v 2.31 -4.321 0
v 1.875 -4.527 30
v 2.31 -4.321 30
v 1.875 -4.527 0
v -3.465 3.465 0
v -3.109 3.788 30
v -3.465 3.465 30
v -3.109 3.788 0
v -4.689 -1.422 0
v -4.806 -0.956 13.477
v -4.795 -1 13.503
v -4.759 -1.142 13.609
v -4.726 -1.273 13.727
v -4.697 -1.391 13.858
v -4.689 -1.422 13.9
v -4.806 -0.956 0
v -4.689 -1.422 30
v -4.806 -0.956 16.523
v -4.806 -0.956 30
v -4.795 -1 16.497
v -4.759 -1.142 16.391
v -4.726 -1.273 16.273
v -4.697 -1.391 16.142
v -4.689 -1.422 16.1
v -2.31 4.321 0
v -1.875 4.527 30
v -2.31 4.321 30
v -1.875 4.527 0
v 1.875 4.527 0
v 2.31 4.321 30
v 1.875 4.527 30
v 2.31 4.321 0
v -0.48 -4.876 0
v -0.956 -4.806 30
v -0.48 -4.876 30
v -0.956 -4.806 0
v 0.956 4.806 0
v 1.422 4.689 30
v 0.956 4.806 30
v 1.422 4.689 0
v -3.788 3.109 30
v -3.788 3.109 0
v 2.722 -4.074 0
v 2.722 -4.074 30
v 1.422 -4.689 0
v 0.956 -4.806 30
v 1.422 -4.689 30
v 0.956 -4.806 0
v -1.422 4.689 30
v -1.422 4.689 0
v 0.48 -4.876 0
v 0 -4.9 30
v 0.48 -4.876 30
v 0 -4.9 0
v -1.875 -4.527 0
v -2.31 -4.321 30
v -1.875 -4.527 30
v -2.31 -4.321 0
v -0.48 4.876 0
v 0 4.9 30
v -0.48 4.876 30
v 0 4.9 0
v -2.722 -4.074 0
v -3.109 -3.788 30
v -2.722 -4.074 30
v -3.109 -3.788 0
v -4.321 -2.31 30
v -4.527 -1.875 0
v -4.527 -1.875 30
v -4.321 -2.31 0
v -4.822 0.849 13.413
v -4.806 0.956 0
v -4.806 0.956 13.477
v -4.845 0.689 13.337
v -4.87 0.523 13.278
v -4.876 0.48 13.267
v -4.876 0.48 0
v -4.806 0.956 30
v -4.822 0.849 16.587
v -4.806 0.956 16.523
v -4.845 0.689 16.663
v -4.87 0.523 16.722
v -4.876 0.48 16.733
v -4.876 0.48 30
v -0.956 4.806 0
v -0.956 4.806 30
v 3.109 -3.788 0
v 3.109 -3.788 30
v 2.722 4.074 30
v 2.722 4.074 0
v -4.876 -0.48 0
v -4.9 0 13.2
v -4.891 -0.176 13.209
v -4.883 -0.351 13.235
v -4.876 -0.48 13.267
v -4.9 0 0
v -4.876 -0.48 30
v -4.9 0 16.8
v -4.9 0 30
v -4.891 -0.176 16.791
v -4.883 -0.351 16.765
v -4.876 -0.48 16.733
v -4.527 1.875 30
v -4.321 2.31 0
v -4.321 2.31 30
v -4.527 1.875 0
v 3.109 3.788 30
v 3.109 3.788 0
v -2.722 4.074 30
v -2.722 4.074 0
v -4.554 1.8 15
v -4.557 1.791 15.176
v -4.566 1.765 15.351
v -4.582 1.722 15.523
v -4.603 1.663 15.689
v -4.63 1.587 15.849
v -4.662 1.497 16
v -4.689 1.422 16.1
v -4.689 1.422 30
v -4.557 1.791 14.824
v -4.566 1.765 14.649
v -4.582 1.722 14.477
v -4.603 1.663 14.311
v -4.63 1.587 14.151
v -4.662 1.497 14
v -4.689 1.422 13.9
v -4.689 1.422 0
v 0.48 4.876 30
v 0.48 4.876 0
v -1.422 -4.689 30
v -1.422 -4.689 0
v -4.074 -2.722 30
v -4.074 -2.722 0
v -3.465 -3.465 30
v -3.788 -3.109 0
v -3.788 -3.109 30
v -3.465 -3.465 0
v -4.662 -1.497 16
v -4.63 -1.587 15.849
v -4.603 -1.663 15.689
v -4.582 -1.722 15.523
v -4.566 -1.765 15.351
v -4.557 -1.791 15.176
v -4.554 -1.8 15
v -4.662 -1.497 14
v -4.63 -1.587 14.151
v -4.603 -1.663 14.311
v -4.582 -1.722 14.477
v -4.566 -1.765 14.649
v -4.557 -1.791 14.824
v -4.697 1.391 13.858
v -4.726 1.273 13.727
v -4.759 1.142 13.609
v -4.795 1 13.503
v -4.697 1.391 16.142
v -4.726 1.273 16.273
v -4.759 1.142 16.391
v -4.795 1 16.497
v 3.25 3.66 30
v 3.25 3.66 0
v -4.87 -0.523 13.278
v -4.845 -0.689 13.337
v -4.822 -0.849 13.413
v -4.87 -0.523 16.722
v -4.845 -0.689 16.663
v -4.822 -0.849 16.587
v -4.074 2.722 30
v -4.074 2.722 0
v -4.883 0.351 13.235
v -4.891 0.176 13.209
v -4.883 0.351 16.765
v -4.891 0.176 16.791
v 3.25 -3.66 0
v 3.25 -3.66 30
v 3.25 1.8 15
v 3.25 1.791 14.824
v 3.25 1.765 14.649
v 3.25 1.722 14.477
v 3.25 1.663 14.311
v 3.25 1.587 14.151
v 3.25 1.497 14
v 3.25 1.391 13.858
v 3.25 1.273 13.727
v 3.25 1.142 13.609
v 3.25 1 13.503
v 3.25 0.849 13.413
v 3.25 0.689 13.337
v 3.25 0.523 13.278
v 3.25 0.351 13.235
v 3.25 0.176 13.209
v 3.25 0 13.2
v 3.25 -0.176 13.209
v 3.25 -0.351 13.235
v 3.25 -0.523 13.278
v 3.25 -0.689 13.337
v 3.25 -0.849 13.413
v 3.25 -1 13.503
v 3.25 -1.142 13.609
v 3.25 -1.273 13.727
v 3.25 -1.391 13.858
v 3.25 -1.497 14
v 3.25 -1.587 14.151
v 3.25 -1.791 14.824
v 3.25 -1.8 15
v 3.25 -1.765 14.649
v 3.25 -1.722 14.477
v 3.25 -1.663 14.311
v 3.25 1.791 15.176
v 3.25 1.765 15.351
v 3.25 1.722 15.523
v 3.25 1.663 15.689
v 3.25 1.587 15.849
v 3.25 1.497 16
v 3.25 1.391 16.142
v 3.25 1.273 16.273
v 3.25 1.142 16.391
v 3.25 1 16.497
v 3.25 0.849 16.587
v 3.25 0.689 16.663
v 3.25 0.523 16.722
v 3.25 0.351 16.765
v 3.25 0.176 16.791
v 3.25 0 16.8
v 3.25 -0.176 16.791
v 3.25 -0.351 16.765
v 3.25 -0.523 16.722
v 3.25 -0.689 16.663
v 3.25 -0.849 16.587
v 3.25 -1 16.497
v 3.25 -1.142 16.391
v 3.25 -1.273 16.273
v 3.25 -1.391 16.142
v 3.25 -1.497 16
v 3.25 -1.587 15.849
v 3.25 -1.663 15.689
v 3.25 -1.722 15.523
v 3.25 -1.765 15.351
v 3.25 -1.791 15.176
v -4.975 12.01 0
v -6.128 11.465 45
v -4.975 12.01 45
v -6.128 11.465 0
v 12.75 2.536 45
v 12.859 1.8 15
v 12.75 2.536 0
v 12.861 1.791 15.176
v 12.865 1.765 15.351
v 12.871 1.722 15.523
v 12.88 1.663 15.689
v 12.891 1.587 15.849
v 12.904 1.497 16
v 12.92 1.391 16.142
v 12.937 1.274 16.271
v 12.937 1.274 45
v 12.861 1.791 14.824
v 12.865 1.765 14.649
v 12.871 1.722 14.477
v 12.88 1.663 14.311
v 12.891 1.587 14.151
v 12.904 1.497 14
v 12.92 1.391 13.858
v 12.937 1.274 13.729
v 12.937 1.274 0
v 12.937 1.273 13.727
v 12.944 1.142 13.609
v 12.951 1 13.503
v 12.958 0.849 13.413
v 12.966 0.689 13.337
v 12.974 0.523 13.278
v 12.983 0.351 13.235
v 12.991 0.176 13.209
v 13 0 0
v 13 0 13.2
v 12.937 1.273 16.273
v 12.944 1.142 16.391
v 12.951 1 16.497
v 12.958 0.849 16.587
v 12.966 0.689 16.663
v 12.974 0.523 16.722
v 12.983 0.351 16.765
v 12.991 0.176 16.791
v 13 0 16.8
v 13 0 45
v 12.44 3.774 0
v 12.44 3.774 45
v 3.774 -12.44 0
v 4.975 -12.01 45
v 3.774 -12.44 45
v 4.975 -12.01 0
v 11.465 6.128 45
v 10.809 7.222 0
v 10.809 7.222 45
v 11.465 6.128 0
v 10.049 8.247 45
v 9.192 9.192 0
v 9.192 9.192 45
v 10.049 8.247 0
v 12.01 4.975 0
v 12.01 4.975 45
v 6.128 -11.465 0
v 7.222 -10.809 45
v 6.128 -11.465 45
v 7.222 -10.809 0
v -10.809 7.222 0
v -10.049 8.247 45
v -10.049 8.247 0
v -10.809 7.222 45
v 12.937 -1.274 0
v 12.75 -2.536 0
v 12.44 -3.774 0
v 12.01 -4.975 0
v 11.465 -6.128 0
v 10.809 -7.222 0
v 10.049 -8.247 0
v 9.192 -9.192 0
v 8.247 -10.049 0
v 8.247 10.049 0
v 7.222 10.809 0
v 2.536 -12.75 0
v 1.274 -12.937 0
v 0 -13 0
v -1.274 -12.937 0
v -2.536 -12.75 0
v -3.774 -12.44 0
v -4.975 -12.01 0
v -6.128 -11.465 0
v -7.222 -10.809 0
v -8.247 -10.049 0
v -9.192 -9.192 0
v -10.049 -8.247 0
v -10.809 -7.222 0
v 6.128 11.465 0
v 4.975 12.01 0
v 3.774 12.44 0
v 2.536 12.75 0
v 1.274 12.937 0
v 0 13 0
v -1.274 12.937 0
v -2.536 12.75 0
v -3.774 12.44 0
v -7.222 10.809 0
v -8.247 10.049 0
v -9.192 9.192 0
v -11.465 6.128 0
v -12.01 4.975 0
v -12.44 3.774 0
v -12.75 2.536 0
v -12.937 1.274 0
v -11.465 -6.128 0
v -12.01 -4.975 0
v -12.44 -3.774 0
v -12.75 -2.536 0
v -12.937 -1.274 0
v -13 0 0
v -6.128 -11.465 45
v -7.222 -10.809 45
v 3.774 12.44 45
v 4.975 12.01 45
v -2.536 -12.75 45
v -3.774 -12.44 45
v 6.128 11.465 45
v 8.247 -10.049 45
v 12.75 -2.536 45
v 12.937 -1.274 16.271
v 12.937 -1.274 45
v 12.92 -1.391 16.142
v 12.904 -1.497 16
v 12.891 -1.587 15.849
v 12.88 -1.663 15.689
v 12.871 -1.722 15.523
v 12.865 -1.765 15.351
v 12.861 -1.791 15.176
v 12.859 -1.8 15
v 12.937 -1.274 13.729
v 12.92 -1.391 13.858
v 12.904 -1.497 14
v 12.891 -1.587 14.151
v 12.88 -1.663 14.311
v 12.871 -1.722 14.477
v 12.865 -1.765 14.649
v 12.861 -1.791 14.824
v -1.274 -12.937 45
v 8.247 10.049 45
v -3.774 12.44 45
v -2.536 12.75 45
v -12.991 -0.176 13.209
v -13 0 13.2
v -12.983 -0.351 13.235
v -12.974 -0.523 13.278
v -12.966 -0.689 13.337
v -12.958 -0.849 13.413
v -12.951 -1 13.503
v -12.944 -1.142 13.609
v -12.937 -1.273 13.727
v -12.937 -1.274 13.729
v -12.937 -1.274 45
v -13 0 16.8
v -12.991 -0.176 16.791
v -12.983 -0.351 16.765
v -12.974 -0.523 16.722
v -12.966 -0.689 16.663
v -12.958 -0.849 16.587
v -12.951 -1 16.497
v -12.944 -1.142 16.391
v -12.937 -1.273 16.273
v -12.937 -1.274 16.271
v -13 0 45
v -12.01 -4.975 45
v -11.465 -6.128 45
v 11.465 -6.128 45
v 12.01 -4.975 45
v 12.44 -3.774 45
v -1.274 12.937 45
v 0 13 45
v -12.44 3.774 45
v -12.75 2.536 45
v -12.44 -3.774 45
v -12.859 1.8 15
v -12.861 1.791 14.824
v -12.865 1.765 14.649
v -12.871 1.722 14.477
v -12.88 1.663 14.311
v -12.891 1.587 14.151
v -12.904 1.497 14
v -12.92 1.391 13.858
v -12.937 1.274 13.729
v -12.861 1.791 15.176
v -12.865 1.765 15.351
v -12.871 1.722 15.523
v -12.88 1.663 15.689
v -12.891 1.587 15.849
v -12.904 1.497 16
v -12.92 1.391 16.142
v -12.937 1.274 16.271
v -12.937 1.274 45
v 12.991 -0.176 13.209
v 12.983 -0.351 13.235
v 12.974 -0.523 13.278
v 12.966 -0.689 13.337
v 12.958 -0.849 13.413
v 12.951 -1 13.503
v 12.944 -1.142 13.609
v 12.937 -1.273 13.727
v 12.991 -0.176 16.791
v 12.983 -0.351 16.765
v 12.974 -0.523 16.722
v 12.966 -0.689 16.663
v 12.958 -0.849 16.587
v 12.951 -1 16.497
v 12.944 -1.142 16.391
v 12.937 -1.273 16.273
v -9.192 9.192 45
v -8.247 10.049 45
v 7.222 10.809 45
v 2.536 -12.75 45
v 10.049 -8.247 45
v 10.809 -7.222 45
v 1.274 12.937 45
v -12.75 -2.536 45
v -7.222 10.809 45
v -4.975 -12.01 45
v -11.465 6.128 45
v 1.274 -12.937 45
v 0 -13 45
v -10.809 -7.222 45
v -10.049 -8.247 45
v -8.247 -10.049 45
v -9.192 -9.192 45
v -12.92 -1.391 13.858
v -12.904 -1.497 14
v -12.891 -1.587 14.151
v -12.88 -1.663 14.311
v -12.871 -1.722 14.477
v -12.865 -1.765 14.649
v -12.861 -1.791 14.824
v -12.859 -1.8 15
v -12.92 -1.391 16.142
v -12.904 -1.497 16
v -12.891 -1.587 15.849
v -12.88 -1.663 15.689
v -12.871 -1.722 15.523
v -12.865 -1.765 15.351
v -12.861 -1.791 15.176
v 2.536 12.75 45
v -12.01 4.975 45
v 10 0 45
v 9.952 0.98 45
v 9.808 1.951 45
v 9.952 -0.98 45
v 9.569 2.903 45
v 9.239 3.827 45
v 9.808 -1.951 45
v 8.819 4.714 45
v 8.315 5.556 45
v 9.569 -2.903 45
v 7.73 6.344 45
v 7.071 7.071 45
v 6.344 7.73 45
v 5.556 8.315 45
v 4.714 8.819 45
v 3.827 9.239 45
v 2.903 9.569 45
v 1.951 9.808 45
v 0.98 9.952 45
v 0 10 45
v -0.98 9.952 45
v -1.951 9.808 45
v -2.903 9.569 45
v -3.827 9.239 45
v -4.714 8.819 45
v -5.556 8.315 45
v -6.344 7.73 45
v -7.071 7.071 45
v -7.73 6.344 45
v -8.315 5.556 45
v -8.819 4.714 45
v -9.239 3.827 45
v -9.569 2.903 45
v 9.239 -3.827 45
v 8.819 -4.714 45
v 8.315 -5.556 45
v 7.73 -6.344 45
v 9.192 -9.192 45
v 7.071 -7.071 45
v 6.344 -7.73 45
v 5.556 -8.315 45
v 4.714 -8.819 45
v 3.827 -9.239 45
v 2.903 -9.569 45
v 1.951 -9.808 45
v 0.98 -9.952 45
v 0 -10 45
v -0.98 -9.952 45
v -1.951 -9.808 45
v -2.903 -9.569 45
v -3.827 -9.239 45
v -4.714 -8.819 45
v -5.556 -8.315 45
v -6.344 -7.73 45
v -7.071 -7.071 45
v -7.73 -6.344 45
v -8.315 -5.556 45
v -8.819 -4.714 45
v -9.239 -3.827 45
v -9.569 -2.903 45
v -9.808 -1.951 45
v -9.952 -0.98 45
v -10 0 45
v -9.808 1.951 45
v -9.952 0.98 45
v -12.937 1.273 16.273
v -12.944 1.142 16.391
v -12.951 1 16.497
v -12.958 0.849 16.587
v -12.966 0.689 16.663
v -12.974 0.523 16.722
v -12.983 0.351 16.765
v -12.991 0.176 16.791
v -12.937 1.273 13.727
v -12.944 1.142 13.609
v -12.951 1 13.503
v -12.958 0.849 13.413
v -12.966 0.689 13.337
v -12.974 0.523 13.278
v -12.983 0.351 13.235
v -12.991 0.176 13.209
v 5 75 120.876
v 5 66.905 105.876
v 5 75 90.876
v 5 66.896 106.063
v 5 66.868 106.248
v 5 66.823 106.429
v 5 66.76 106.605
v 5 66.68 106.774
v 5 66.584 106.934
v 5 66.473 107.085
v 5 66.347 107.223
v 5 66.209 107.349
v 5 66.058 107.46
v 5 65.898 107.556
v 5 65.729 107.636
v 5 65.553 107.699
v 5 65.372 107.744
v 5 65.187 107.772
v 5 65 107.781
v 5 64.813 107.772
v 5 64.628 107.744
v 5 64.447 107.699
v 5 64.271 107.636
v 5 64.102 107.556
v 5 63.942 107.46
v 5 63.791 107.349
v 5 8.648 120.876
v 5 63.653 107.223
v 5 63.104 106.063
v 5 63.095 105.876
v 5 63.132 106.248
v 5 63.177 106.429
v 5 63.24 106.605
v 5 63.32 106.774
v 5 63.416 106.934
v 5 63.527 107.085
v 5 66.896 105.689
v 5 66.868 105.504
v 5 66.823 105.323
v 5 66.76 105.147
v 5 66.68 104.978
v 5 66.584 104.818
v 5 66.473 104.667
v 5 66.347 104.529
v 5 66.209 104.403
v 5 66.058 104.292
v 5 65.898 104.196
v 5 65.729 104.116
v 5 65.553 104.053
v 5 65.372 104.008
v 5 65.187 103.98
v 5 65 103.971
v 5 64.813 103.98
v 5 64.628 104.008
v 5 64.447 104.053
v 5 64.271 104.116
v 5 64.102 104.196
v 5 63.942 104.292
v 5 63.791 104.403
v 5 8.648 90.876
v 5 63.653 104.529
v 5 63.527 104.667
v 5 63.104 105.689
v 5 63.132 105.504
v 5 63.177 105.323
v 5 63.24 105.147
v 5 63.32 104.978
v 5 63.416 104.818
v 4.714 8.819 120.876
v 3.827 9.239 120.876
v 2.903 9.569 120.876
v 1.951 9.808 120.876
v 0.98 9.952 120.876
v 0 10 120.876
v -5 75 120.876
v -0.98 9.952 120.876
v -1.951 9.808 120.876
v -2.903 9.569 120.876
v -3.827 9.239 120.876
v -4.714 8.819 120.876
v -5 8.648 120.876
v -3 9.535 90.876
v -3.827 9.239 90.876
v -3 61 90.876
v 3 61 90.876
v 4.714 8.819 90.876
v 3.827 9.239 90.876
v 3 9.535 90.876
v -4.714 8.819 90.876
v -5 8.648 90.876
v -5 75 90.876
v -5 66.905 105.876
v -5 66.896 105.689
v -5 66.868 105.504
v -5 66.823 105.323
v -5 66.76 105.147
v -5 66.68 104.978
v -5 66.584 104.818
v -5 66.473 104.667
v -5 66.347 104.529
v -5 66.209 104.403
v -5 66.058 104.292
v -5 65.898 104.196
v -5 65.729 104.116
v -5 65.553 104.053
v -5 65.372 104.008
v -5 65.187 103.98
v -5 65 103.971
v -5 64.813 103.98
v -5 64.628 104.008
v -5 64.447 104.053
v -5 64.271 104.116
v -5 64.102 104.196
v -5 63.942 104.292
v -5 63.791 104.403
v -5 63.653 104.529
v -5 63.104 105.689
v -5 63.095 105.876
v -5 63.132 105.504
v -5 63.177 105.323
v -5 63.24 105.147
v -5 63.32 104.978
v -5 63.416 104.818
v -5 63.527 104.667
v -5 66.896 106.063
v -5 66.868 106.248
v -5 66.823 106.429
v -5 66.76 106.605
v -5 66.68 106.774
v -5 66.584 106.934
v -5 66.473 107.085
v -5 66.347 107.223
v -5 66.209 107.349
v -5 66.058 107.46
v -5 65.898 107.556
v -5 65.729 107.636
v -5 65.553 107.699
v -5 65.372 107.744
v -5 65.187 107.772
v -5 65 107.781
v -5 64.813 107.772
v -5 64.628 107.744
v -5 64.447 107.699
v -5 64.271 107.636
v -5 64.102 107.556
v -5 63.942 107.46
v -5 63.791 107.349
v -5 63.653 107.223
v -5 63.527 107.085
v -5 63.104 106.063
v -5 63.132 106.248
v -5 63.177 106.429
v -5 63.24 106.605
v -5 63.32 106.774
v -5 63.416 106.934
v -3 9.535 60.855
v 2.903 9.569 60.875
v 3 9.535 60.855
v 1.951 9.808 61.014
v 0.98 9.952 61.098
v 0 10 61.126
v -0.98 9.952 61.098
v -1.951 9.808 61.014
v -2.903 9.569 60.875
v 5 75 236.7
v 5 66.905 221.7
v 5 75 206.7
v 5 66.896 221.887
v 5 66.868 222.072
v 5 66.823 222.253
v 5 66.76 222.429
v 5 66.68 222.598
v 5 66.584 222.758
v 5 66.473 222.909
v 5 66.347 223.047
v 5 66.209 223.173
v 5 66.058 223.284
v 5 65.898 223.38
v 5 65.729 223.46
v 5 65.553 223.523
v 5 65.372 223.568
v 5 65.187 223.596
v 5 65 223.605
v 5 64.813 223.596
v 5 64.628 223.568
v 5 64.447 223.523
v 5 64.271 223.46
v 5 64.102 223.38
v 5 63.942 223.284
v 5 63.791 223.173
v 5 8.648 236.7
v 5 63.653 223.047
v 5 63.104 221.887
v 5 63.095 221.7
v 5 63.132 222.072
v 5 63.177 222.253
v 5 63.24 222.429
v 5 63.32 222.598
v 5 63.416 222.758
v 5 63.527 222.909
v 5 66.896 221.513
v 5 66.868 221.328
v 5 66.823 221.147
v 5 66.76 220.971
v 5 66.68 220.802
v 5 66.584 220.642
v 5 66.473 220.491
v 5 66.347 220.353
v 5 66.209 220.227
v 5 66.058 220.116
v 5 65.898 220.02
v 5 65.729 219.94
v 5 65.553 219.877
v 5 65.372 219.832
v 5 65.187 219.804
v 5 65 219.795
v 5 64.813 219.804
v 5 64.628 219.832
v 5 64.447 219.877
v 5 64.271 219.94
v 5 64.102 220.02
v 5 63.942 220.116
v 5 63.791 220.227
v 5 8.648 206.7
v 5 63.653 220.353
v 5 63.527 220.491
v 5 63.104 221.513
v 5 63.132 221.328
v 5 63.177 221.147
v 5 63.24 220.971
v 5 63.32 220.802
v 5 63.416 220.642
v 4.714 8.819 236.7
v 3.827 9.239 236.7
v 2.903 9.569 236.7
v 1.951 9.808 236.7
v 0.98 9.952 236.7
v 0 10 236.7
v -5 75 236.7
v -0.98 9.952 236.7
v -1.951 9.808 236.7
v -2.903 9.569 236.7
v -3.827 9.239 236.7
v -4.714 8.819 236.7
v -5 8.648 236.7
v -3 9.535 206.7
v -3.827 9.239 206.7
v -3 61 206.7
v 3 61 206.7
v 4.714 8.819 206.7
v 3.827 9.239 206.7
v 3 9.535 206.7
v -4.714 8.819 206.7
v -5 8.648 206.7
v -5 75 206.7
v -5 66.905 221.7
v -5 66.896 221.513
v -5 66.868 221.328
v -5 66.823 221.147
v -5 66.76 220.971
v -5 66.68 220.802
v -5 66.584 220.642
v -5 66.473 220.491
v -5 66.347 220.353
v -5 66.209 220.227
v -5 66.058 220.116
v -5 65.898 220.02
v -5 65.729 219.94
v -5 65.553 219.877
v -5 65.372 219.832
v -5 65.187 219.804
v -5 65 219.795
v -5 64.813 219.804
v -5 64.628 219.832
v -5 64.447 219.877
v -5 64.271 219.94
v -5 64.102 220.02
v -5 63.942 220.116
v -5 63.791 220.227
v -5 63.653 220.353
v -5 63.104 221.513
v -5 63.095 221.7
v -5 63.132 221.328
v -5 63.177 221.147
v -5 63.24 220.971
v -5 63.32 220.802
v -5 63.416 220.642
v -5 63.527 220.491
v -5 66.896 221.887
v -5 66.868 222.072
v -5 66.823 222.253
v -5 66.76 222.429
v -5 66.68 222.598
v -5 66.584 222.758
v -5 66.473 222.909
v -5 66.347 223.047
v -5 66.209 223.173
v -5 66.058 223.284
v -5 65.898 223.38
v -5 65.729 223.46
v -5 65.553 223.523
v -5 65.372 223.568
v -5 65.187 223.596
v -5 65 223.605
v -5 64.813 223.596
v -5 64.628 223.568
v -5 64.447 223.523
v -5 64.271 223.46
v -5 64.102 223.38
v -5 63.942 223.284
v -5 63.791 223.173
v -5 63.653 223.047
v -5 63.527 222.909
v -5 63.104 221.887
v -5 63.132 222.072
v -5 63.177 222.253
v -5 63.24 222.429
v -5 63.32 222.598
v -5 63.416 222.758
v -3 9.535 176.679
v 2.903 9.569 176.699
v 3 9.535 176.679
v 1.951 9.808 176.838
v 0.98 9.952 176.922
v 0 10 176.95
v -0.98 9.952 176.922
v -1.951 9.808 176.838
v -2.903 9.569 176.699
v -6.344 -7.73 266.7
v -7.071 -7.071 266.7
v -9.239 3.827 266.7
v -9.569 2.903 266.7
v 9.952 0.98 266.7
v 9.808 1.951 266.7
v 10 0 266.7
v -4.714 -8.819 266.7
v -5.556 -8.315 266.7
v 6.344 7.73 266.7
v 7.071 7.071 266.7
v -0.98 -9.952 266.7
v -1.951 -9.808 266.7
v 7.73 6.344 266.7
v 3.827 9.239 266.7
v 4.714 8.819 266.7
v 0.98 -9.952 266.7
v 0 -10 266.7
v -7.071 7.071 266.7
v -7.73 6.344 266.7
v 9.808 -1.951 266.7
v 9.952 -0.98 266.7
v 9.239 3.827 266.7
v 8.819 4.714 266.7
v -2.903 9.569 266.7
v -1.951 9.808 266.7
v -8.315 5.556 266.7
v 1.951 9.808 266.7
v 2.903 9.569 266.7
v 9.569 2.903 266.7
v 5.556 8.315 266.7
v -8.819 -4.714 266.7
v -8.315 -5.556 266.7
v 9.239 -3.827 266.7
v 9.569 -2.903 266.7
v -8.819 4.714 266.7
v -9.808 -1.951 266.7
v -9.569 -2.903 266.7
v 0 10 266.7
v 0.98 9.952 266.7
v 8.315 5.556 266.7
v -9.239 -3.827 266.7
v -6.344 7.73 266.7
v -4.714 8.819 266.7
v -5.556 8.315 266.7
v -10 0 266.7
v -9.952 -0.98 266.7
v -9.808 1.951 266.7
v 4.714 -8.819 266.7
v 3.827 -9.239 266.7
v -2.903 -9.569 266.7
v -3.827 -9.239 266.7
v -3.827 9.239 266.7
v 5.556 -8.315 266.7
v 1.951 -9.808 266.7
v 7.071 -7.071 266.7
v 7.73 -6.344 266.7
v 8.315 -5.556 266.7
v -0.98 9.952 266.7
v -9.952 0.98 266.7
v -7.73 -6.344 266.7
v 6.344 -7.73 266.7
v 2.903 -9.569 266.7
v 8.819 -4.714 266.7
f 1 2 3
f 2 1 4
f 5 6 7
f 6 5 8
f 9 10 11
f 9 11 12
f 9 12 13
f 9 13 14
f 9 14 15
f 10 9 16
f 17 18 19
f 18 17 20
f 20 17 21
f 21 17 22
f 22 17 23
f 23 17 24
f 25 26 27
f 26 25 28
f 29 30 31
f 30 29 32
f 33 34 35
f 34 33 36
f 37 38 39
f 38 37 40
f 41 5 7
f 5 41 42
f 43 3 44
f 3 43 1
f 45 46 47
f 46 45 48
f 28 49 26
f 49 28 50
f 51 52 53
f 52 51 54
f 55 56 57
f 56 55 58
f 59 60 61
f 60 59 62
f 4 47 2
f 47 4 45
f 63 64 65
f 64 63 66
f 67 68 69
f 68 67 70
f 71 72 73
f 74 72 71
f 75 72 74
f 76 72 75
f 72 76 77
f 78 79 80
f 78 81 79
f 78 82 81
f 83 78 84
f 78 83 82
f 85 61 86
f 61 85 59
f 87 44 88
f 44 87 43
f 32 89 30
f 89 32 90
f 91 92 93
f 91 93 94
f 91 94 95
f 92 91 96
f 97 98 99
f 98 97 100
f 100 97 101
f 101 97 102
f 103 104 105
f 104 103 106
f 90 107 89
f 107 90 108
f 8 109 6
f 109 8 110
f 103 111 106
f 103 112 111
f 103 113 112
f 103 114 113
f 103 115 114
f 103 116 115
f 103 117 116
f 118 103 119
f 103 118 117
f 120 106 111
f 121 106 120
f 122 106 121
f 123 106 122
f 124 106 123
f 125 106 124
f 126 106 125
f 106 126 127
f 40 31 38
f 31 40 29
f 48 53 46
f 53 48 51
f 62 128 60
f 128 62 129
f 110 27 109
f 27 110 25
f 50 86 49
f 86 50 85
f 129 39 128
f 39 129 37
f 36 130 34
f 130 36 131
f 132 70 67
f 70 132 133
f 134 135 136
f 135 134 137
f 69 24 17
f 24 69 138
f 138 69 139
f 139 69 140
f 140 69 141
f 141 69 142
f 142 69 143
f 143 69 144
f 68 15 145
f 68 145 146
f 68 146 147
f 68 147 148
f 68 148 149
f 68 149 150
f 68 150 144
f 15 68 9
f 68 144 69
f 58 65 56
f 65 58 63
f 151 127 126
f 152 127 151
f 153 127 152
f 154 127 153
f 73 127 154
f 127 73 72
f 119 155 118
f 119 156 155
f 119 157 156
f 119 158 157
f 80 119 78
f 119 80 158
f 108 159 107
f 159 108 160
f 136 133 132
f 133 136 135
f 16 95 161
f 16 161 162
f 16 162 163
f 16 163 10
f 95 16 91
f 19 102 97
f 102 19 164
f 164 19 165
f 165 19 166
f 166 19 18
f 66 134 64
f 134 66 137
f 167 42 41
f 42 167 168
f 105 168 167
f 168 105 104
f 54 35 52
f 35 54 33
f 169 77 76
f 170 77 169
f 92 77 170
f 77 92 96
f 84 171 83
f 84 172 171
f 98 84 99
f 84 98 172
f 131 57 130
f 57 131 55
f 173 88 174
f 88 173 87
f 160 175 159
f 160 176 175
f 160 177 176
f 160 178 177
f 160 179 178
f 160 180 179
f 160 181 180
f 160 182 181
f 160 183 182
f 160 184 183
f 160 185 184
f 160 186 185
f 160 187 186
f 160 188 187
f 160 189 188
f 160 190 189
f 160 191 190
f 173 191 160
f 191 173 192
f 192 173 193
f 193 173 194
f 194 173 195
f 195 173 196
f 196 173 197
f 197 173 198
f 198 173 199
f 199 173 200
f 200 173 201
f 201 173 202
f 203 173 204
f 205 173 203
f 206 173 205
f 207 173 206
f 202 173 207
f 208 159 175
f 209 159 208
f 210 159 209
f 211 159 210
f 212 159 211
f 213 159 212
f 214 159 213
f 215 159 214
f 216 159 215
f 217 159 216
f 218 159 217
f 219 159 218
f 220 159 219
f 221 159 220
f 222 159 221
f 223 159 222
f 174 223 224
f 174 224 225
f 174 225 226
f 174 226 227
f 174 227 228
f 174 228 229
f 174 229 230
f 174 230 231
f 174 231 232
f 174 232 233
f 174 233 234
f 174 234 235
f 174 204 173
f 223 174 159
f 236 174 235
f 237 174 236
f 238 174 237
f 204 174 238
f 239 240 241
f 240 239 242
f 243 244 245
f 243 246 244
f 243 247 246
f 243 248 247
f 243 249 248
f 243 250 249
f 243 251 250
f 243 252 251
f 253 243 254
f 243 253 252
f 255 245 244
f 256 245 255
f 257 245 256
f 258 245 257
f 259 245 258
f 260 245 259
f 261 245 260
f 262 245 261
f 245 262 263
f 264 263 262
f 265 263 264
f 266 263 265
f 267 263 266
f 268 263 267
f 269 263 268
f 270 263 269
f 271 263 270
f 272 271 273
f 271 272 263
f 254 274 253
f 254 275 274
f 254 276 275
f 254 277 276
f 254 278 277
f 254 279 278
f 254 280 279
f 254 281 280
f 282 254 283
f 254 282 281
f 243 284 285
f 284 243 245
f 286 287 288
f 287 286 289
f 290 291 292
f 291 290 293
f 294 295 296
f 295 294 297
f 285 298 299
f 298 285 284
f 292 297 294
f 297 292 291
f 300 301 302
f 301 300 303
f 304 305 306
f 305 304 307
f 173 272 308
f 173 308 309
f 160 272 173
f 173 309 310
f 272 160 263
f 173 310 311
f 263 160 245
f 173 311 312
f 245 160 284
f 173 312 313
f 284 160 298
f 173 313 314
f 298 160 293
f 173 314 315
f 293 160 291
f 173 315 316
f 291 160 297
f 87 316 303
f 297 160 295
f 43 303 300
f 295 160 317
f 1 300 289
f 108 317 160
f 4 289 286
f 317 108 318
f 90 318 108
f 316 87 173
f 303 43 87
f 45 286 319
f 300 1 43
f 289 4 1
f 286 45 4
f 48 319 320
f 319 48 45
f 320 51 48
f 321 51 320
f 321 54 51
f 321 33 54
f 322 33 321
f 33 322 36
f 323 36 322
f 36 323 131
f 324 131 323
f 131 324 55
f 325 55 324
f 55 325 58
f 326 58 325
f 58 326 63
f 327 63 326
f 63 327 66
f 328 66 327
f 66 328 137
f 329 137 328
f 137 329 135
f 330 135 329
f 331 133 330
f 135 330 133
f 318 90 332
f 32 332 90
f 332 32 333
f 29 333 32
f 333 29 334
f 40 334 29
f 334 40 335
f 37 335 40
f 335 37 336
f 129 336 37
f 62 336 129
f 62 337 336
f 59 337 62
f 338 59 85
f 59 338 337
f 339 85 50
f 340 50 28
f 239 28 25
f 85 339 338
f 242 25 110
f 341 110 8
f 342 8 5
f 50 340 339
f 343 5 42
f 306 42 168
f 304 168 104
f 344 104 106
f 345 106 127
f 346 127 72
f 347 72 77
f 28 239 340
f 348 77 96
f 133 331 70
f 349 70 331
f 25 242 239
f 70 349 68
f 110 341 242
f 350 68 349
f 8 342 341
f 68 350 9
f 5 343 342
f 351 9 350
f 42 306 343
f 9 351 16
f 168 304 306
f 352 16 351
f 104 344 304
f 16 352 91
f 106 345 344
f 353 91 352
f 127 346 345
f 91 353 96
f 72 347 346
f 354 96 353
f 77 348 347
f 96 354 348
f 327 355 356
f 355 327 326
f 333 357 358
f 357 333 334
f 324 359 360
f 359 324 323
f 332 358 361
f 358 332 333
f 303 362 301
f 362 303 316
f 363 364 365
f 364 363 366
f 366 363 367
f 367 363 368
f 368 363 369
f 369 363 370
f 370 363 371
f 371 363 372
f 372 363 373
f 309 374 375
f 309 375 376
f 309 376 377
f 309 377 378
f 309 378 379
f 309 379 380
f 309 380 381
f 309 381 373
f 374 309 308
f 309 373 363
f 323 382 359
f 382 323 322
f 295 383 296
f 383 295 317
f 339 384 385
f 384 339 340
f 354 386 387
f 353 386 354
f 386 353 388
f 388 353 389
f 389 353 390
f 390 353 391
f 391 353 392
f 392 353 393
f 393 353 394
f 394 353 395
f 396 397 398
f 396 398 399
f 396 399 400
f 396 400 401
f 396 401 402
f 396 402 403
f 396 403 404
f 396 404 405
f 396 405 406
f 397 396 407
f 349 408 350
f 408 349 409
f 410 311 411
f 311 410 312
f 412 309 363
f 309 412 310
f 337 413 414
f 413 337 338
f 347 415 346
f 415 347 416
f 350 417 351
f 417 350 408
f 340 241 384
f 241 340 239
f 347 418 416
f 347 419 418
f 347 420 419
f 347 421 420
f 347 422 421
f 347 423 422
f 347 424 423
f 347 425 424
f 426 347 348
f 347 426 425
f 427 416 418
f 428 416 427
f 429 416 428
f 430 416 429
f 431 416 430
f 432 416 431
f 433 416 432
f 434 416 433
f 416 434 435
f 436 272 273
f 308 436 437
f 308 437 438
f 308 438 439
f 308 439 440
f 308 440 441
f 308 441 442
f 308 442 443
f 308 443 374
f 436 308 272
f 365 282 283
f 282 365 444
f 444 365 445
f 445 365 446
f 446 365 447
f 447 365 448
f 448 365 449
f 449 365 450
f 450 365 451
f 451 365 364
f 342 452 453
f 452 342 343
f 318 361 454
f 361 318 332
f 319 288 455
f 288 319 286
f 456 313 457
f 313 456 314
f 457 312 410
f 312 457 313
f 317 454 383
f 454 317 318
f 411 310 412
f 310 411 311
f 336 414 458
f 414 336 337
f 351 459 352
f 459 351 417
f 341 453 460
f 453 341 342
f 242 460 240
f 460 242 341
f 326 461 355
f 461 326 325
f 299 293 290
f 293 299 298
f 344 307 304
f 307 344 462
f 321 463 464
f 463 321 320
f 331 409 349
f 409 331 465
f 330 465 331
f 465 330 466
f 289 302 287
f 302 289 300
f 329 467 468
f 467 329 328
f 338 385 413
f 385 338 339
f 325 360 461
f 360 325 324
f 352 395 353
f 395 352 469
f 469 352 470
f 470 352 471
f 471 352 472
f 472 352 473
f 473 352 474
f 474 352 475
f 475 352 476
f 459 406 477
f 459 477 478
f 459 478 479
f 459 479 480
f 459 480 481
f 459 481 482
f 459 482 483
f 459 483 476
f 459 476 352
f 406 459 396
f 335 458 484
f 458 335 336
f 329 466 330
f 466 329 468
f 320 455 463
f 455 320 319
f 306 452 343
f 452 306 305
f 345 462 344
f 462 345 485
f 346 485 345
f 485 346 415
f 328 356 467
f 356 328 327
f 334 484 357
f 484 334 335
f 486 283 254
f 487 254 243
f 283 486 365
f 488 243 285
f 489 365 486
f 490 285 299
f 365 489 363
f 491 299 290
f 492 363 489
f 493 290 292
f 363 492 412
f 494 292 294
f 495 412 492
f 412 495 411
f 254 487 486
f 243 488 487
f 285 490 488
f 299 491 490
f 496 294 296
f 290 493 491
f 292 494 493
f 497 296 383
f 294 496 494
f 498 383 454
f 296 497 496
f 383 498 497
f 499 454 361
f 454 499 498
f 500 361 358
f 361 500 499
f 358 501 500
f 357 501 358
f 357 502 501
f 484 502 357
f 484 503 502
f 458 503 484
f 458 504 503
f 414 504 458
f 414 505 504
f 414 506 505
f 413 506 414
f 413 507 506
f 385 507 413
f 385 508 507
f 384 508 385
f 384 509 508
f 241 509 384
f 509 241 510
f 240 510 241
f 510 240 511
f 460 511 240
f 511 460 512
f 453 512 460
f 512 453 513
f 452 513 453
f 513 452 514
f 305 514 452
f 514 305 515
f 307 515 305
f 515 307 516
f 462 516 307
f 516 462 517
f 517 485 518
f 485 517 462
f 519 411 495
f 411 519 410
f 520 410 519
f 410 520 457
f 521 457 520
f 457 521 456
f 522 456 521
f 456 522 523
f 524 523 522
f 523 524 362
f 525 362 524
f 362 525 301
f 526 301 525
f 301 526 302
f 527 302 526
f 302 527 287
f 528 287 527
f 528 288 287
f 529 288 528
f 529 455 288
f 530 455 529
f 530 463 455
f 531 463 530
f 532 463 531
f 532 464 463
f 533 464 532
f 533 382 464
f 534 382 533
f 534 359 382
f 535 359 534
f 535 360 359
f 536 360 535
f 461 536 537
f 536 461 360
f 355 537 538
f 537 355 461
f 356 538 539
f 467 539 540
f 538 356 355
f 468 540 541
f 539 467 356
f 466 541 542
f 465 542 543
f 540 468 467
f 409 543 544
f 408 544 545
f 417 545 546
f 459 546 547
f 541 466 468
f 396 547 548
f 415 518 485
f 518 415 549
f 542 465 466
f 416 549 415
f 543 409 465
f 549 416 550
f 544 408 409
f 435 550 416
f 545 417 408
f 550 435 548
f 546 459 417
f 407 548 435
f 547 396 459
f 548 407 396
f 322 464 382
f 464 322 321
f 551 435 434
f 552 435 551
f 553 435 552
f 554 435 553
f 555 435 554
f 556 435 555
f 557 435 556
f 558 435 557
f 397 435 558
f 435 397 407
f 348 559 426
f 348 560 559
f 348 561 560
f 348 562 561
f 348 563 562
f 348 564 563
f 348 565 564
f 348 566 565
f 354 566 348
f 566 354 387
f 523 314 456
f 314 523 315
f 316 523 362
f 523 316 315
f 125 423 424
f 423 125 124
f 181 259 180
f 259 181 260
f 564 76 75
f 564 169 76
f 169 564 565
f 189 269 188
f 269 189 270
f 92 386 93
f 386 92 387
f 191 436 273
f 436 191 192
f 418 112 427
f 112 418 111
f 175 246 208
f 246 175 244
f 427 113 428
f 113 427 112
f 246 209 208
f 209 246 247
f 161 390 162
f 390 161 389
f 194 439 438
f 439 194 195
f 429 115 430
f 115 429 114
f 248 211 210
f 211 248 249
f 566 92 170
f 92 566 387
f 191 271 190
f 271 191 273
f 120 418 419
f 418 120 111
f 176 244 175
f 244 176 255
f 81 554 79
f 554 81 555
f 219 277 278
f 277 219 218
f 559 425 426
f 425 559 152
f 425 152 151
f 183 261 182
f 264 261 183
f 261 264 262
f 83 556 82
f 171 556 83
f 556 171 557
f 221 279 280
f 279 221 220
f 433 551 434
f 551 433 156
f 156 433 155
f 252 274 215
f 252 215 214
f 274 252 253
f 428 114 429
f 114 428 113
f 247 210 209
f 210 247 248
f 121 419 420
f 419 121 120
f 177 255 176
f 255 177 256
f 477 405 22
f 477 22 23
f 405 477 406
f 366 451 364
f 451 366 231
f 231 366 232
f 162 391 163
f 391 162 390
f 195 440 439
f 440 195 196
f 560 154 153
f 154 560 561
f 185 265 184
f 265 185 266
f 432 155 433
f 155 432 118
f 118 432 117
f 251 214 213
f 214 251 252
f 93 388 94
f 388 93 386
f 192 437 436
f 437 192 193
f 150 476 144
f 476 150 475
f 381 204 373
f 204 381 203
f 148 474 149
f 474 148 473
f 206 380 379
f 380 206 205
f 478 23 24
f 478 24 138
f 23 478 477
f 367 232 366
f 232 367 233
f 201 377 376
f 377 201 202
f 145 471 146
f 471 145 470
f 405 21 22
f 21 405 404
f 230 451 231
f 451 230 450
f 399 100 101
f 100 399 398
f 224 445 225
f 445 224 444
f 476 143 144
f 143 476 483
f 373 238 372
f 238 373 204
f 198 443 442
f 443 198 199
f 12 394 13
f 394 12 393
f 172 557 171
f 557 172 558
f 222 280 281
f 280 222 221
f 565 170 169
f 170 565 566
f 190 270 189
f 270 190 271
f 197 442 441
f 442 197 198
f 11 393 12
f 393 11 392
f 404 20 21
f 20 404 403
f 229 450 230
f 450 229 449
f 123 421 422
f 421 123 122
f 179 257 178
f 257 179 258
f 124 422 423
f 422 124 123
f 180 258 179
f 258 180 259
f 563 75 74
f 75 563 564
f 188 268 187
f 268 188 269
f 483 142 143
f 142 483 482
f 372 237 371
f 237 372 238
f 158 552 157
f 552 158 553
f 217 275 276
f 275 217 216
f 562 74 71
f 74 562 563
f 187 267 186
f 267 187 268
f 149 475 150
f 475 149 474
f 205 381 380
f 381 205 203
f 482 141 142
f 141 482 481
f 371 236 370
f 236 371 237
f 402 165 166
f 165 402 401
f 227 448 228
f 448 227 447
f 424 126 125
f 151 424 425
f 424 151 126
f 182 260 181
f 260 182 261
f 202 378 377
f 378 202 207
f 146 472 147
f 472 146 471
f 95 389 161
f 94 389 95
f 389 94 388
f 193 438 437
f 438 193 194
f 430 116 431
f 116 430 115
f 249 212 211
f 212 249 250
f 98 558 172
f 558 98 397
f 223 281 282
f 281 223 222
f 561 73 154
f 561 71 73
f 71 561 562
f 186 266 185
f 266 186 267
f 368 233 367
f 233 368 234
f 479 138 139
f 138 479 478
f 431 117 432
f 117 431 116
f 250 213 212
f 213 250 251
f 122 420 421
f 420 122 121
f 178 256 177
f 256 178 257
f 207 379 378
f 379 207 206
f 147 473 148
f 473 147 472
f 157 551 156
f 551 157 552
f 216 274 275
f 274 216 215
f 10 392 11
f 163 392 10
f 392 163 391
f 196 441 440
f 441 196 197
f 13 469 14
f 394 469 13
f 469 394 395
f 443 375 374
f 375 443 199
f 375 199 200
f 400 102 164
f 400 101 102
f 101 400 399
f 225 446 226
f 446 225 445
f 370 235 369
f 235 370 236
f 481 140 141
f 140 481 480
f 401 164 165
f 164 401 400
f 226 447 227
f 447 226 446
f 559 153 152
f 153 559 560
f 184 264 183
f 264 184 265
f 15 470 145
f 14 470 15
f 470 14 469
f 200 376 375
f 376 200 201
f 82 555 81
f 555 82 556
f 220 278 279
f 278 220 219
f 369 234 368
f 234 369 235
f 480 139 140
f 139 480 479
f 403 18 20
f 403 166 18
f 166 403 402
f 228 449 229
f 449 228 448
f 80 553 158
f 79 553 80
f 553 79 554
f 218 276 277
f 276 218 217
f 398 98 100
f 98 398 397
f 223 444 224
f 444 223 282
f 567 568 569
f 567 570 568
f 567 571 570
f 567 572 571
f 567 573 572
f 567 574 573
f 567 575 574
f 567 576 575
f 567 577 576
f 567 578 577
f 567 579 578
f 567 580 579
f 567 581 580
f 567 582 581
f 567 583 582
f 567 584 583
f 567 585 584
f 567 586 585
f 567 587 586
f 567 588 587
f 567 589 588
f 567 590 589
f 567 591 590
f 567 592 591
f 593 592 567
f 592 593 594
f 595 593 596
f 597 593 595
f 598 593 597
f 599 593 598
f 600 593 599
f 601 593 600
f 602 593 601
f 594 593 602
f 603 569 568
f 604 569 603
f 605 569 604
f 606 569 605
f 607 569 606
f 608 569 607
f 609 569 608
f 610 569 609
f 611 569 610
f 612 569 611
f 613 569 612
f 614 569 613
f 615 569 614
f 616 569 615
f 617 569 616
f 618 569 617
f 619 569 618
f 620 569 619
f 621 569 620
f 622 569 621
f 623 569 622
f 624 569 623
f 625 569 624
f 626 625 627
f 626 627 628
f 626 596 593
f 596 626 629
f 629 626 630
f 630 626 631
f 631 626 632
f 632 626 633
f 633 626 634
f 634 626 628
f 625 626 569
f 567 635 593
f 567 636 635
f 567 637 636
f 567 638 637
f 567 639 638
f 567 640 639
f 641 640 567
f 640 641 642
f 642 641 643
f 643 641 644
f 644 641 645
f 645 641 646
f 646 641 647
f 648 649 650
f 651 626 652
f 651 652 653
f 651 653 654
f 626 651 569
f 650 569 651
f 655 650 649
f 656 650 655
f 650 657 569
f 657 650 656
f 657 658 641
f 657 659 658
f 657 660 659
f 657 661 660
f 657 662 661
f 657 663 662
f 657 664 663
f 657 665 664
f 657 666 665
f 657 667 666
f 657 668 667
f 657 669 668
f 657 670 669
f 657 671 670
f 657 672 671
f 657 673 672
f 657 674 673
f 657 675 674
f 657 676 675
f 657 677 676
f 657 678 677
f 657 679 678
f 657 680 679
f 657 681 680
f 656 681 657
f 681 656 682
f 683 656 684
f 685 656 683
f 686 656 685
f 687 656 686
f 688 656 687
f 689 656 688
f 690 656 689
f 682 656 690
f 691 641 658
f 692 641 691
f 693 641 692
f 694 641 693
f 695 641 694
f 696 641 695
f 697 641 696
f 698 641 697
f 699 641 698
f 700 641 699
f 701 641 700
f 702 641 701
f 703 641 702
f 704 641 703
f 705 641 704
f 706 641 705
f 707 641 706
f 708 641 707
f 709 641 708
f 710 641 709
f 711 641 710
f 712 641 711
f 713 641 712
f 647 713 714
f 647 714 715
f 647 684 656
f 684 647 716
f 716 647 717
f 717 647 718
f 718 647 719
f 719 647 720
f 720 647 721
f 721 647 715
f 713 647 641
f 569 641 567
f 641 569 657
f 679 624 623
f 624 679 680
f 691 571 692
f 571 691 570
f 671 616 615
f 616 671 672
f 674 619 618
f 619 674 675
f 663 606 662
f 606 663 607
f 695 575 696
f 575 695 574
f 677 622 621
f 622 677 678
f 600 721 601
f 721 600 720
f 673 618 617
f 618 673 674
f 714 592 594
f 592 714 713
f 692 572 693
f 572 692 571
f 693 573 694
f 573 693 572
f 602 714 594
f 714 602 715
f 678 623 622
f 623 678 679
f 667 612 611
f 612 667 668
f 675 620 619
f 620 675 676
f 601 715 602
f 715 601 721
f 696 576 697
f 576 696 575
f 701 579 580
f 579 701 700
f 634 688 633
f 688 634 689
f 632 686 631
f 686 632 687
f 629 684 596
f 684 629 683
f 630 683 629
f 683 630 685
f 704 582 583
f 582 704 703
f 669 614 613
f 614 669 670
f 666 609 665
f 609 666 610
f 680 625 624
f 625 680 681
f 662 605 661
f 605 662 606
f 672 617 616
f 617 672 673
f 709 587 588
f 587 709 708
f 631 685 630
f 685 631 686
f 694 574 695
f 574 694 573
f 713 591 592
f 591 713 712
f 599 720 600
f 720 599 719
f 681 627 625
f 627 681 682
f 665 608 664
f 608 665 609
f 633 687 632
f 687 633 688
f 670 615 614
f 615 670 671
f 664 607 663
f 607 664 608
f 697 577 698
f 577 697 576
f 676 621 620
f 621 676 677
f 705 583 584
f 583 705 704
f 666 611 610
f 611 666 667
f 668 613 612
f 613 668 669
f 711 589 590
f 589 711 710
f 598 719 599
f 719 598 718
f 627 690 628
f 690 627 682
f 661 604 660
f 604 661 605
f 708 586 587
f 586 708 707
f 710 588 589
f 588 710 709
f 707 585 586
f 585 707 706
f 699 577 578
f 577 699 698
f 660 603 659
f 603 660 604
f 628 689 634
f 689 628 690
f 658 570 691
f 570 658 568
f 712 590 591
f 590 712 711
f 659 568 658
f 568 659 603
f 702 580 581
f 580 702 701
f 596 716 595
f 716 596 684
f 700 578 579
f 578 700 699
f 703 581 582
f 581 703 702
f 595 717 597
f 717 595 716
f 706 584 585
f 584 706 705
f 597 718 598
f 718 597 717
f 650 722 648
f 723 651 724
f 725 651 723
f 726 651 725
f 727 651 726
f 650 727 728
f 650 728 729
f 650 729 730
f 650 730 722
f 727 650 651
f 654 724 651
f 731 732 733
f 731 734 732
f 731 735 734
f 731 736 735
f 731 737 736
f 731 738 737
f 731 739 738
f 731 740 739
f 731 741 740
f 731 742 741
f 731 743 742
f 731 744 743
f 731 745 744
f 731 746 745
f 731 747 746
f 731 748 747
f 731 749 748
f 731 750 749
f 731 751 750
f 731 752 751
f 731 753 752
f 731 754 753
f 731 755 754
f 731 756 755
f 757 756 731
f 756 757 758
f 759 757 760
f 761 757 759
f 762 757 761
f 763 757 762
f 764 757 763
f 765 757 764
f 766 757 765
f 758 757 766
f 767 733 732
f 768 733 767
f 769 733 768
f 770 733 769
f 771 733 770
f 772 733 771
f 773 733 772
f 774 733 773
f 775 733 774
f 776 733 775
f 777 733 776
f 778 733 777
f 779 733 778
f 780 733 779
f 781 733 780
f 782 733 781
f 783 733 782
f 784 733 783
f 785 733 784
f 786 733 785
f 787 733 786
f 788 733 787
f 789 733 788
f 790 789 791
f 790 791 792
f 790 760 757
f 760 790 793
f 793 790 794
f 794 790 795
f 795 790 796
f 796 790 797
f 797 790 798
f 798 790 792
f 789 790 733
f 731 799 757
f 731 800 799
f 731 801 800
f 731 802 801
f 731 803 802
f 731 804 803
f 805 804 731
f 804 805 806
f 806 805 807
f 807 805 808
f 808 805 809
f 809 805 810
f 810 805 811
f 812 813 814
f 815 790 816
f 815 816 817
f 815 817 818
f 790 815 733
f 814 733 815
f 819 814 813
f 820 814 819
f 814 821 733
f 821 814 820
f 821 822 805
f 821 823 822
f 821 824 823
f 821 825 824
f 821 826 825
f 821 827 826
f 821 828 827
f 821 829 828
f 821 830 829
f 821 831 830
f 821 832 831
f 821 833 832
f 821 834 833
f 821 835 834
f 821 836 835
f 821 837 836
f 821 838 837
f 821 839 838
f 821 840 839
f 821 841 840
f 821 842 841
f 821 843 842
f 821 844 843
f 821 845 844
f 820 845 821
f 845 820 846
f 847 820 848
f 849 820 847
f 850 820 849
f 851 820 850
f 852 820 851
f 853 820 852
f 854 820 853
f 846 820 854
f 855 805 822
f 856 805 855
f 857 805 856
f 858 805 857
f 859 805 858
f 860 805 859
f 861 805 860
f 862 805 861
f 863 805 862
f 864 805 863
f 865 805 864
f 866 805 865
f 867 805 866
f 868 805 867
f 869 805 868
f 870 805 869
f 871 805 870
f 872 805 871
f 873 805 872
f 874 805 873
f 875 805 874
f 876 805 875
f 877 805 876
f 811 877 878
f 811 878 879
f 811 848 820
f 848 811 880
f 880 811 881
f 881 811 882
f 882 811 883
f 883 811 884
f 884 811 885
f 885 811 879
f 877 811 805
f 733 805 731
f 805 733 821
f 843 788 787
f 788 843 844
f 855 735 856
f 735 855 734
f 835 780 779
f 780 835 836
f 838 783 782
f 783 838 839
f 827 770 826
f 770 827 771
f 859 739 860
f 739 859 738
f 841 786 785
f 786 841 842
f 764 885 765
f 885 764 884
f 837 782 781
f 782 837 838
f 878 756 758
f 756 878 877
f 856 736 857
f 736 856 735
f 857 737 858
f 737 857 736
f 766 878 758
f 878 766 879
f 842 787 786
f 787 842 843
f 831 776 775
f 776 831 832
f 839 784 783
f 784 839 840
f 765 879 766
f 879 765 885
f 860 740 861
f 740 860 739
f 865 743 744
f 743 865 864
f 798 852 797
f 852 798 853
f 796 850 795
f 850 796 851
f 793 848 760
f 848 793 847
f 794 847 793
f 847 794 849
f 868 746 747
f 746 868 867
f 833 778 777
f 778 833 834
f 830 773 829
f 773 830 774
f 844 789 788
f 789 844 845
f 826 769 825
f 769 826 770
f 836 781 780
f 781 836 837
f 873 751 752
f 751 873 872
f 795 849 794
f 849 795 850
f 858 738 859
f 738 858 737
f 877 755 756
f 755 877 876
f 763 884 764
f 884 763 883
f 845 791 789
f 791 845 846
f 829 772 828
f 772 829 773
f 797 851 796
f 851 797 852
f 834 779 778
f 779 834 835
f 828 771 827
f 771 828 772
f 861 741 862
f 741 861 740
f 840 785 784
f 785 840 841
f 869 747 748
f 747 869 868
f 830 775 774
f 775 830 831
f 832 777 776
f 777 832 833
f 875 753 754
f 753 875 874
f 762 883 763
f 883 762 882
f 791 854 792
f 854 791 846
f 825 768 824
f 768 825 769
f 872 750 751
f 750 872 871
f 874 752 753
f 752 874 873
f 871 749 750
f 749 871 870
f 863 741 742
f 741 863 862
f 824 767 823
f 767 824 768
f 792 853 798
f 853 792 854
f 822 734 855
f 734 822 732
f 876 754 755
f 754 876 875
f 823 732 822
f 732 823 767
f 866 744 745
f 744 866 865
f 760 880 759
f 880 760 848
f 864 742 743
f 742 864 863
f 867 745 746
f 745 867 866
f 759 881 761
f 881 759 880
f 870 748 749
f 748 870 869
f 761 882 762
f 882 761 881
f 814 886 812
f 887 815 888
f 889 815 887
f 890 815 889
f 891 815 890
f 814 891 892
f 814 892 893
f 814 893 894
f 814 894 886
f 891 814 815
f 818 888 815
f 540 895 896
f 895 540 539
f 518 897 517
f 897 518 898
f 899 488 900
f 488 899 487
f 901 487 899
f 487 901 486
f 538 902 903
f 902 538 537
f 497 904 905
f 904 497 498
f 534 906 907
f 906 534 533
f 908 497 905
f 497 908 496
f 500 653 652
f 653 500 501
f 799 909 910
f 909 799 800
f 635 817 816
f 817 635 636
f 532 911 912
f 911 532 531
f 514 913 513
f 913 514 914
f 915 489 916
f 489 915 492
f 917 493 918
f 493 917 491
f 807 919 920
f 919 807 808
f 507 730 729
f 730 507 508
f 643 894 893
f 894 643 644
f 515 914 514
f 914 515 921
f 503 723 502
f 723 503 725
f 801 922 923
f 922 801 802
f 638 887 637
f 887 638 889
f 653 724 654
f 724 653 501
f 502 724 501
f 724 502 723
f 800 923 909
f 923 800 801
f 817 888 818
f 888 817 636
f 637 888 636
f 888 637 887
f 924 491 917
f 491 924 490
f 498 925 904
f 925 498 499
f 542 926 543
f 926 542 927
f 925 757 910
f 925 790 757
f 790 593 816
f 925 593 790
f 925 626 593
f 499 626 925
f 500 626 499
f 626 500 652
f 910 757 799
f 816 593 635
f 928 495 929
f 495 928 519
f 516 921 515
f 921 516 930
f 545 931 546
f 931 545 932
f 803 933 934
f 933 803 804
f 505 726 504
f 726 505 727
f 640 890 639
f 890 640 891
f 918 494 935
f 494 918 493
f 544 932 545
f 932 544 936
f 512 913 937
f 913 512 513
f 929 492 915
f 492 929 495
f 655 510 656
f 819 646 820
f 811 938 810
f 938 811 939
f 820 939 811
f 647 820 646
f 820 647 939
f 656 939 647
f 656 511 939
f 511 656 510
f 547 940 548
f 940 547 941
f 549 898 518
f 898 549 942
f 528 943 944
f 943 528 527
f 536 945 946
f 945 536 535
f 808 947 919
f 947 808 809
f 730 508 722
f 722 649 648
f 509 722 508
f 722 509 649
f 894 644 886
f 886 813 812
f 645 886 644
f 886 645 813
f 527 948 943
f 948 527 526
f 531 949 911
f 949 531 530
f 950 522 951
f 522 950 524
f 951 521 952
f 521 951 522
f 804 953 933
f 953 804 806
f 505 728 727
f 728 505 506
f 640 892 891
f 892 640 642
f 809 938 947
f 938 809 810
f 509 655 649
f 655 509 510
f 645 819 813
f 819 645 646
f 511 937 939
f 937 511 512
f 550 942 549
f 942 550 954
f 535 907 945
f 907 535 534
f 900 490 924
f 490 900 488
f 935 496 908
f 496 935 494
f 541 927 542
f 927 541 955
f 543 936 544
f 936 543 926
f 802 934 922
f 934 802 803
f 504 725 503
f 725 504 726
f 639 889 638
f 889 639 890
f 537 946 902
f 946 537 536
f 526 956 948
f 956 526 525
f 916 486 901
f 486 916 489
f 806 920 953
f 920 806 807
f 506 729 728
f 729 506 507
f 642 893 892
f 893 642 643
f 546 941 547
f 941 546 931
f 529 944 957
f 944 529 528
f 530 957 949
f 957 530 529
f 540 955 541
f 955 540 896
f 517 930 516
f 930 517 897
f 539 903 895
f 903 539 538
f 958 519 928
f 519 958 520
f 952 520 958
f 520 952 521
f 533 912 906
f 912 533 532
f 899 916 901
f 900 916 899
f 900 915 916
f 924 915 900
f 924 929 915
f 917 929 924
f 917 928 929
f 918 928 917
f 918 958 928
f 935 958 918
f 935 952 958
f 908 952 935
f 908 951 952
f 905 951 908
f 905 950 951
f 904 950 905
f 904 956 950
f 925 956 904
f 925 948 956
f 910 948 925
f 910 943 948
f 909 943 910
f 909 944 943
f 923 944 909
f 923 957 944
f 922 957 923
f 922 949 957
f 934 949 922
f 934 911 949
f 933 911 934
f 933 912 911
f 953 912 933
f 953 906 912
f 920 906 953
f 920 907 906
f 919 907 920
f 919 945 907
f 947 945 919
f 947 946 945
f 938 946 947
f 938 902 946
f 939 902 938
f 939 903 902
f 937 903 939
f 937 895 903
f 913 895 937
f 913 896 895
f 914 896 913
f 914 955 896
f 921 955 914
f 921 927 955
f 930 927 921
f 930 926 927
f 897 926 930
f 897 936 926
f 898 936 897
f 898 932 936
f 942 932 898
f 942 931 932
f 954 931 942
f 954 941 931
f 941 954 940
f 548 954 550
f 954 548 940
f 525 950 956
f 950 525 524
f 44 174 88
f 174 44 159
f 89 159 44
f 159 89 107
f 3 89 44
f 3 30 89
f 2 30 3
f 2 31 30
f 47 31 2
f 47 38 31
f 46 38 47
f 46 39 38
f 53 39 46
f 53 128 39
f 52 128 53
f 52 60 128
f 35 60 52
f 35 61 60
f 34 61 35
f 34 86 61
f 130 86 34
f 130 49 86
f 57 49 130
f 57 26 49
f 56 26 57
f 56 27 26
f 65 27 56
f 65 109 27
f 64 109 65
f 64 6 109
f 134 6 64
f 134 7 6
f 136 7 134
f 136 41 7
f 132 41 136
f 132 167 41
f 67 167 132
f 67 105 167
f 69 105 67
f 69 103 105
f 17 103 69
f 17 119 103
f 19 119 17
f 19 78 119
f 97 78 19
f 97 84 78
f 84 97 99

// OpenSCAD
// FILE: 10_Final_Antenna_Mast_Fixed_Render.scad
// FIXED: Rendering issues resolved by simplifying the D-socket logic.

$fn = 64; 
mm = 25.4; 

// --- SHAFT & ANTENNA SPECS ---
gear_rod_dia  = 9.5;    // Matches your rod.scad [cite: 91, 100]
d_slice_depth = 1.5;    // Matches the 1.5mm slice in your rod [cite: 91, 100]
socket_depth  = 30;     // [cite: 100]
antenna_h     = 10.5 * mm; // [cite: 101]
hole_spacing  = 4.56 * mm; // [cite: 101]
hole_dia      = 0.15 * mm; // [cite: 102]

// --- GEOMETRY ---
main_rod_dia           = 20; // [cite: 103]
base_reinforcement_dia = 26; // [cite: 103]
horizontal_reach       = 65; // [cite: 104]
arm_height             = 30; // [cite: 104]
arm_width              = 10; // [cite: 105]
gusset_thick           = 6;  // [cite: 106]

// --- ARM SLIDE ADJUSTMENT ---
arm_slide_down = 45; 

// ============================================================
// RENDER
// ============================================================
union() {
    // 1. REINFORCED D-SOCKET BASE
    difference() {
        // Outer Body
        color("Gold") cylinder(h = socket_depth + 15, d = base_reinforcement_dia); // [cite: 107]
        
        // THE D-SOCKET BORE (Simplified logic for rendering)
        translate([0, 0, -1]) {
            difference() {
                // Main Hole
                cylinder(h = socket_depth + 2, d = gear_rod_dia + 0.3); // [cite: 108]
                
                // The D-flat "Wall" 
                // We place a block inside the cylinder to create the flat side
                translate([gear_rod_dia/2 - d_slice_depth, -gear_rod_dia, 0])
                    cube([gear_rod_dia, gear_rod_dia*2, socket_depth + 5]); // [cite: 109]
            }
        }
        
        // Set-screw hole
        translate([0, 0, socket_depth / 2]) rotate([0, 90, 0]) 
            cylinder(h = base_reinforcement_dia + 2, d = 3.6, center=true); // 
    }

    // 2. THE MAIN VERTICAL MAST
    color("Gold") translate([0, 0, socket_depth + 15])
        cylinder(h = antenna_h - (socket_depth + 15), d = main_rod_dia); // [cite: 111]
    
    // Conical transition
    color("Gold") translate([0, 0, socket_depth + 15])
        mirror([0,0,1]) cylinder(h=15, d1=base_reinforcement_dia, d2=main_rod_dia); // [cite: 112]

    // 3. THE TWO REINFORCED FIN ARMS
    // Adjusted loop to ensure arms and antenna holes move together [cite: 113]
    for (z_pos = [antenna_h - hole_spacing - arm_slide_down, antenna_h - arm_slide_down]) { 
        translate([0, 0, z_pos - arm_height/2]) {
            
            // THE HORIZONTAL ARM
            color("Gold") difference() {
                translate([-arm_width/2, 0, 0]) 
                    cube([arm_width, horizontal_reach + 10, arm_height]); // [cite: 114]
                
                // Horizontal Mounting Hole
                translate([-arm_width/2 - 1, horizontal_reach, arm_height/2])
                    rotate([0, 90, 0]) 
                        cylinder(h = arm_width + 2, d = hole_dia); // [cite: 115]
            }
            
            // THE CENTERED MIRRORED SUPPORT GUSSET
            color("Red") 
            translate([-gusset_thick/2, 1, 0]) // [cite: 116]
            rotate([90, 0, 90]) 
            linear_extrude(gusset_thick)
            polygon([[0, 0], [0, -35], [horizontal_reach - 5, 0]]); // [cite: 117]
        }
    }
}
